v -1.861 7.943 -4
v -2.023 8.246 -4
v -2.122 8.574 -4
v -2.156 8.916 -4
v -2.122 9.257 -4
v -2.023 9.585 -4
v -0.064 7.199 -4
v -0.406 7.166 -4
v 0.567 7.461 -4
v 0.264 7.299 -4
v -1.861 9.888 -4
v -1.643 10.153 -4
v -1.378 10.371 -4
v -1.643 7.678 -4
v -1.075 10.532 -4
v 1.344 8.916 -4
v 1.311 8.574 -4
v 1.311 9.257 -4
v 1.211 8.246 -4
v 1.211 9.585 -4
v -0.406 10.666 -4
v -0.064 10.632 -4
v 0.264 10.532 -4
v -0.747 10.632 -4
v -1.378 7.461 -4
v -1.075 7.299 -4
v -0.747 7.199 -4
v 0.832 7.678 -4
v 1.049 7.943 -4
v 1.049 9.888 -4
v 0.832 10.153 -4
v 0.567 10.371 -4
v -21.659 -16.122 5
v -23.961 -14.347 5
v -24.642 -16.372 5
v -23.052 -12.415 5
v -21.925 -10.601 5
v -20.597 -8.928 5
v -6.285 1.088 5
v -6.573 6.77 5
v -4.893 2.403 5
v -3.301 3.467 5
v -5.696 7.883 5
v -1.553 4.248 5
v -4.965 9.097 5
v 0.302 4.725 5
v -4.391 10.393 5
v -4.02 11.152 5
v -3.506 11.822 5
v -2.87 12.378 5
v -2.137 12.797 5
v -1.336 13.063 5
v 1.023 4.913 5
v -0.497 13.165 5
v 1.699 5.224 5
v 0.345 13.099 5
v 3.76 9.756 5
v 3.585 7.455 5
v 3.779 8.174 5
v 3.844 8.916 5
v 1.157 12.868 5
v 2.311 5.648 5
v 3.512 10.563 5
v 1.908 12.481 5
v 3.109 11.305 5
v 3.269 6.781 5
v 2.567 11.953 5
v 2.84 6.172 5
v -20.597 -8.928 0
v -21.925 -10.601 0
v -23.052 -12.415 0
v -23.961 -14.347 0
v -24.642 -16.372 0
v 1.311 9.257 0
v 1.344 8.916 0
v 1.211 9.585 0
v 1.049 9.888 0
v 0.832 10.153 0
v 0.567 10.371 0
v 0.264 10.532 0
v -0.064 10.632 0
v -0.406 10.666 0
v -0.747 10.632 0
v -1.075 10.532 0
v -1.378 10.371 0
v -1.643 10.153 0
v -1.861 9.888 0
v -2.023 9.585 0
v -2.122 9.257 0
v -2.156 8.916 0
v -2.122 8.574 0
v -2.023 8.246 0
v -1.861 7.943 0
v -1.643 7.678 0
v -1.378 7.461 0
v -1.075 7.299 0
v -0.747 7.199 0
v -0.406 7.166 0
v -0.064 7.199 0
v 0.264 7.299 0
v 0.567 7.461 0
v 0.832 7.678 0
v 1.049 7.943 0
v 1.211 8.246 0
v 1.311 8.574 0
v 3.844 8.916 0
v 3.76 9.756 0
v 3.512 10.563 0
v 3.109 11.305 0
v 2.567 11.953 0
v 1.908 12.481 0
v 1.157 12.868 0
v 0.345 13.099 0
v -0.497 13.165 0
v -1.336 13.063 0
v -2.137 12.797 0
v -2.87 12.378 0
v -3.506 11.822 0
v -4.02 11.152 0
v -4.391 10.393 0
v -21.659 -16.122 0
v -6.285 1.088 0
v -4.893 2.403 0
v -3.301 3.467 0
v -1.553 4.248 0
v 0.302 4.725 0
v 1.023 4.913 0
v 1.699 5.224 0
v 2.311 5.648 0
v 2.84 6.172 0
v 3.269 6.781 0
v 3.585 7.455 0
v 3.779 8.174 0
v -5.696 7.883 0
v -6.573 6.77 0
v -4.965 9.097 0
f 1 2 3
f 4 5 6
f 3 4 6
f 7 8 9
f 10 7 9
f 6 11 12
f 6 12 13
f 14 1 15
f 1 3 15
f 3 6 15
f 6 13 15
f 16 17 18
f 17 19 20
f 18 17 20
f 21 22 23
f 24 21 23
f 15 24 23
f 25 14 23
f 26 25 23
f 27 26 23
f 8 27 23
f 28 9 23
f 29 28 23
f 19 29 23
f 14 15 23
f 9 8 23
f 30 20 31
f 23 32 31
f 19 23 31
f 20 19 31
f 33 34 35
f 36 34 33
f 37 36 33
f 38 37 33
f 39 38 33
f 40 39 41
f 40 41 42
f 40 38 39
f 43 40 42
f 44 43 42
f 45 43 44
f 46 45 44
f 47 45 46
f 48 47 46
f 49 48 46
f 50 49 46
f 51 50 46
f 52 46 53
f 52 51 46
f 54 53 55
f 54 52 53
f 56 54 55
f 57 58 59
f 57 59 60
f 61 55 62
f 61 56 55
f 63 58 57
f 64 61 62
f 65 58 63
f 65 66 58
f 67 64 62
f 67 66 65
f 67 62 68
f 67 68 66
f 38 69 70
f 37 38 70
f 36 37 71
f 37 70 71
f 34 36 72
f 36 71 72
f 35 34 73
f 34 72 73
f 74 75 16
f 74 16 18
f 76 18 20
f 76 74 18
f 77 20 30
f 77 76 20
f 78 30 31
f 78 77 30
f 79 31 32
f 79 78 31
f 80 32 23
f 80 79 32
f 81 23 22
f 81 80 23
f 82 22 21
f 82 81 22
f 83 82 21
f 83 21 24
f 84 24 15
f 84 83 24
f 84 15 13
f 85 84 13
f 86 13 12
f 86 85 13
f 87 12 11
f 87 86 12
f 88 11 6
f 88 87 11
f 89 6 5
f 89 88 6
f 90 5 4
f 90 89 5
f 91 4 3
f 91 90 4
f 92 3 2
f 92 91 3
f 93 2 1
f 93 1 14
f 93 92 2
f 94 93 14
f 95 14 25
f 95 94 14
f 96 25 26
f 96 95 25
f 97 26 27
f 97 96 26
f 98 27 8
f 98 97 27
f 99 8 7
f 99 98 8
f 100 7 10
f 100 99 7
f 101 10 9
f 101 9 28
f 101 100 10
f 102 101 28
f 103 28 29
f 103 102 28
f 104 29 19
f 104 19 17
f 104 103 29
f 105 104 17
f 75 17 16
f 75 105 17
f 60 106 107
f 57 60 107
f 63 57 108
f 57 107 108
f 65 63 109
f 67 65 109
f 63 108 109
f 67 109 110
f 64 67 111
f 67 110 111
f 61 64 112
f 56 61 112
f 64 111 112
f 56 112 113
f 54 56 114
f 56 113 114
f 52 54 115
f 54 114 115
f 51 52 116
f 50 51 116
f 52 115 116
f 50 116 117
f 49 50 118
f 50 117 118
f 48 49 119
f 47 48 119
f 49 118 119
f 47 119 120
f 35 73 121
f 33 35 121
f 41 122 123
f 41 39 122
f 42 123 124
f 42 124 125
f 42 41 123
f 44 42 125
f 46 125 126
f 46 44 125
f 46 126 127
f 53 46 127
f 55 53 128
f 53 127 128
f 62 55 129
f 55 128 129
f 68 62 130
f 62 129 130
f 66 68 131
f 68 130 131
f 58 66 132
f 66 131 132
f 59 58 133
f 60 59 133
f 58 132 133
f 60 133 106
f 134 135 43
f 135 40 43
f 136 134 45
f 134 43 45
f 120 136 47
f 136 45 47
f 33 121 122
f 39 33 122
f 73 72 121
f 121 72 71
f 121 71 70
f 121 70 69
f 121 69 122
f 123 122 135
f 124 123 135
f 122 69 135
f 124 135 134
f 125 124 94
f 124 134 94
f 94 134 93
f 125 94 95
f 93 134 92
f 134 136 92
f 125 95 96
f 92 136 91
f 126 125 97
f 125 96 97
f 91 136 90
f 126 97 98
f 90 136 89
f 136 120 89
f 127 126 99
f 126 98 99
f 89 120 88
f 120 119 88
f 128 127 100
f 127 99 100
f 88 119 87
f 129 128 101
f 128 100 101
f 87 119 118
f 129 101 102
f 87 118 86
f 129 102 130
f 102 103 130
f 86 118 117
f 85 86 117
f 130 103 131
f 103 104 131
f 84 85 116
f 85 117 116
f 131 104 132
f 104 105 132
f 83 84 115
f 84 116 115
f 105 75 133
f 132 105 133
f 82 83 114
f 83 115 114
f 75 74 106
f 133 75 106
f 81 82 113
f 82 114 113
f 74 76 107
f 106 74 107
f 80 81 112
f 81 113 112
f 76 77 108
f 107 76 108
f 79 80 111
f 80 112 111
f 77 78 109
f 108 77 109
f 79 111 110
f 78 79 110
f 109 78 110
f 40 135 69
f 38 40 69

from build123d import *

# Parameters (mm, degrees)
F0_R          = 1.75
F1_DEPTH      = 5
F2_DEPTH      = 4
F2_DEPTH_BACK = 5
F3_T1_DEPTH   = 35.3628033386
F4_R          = 11.3728971787


# Not quite as in the source:
# - a fillet or chamfer that OpenCascade refuses, or shapes differently, is made with other operations: its cross-section is extruded or revolved along the edge and cut away or added


with BuildPart() as f1:
    # F0 (on Top) → F1 (new body)
    with BuildSketch(Plane.XY):
        with BuildLine():
            ThreePointArc((-2.5631937321, 5.253964594), (1.7029722297, 5.2256762725), (3.8442630819, 8.9156418184))
            ThreePointArc((3.8442630819, 8.9156418184), (-0.4057369181, 13.1656418184), (-4.6557369181, 8.9156418184))
            ThreePointArc((-4.6557369181, 8.9156418184), (-4.095702464, 6.8069326705), (-2.5631937321, 5.253964594))
        make_face()
        with Locations((-0.4057369181, 8.9156418184)):
            Circle(F0_R, mode=Mode.SUBTRACT)
        with BuildLine():
            ThreePointArc((-2.5631937321, 5.253964594), (-4.095702464, 6.8069326705), (-4.6557369181, 8.9156418184))
            Line((-4.6557369181, 8.9156418184), (-24.6422081436, -13.4571310977))
            Line((-24.6422081436, -13.4571310977), (-21.6591717548, -16.1219939277))
            Line((-21.6591717548, -16.1219939277), (-2.5631937321, 5.253964594))
        make_face()
        Polygon((-21.6591717548, -16.1219939277), (-24.6422081436, -13.4571310977), (-24.6422081436, -16.1219939277), (-24.6422081436, -16.3715779781), align=None)
    extrude(amount=F1_DEPTH)

    # F0 (on Top) → F2 (join, two sides)
    with BuildSketch(Plane.XY) as f2_sk:
        with Locations((-0.4057369181, 8.9156418184)):
            Circle(F0_R)
    extrude(amount=-F2_DEPTH)
    extrude(f2_sk.sketch, amount=F2_DEPTH_BACK)

    # F3: fillet of radius 18.4809579153 on 1 edges, made by hand

    # F3_s2 → F3_t1 (cut)
    with BuildSketch(Plane.XY.offset(-15.1814016693)):
        with BuildLine():
            ThreePointArc((-20.5965728419, -8.9284637364), (-23.0516277567, -12.4150823252), (-24.6422081436, -16.3715779781))
            Line((-24.6422081436, -16.3715779781), (-24.6422081436, -13.4571310977))
            Line((-24.6422081436, -13.4571310977), (-20.5965728419, -8.9284637364))
        make_face()
    extrude(amount=F3_T1_DEPTH, mode=Mode.SUBTRACT)

    # F4
    f4_edges = [f1.edges().sort_by_distance(p)[0] for p in [
        (-2.563194, 5.253965, 2.5),
        (-4.655737, 8.915642, 2.5),
    ]]
    fillet(f4_edges, radius=F4_R)


solid = f1.part
